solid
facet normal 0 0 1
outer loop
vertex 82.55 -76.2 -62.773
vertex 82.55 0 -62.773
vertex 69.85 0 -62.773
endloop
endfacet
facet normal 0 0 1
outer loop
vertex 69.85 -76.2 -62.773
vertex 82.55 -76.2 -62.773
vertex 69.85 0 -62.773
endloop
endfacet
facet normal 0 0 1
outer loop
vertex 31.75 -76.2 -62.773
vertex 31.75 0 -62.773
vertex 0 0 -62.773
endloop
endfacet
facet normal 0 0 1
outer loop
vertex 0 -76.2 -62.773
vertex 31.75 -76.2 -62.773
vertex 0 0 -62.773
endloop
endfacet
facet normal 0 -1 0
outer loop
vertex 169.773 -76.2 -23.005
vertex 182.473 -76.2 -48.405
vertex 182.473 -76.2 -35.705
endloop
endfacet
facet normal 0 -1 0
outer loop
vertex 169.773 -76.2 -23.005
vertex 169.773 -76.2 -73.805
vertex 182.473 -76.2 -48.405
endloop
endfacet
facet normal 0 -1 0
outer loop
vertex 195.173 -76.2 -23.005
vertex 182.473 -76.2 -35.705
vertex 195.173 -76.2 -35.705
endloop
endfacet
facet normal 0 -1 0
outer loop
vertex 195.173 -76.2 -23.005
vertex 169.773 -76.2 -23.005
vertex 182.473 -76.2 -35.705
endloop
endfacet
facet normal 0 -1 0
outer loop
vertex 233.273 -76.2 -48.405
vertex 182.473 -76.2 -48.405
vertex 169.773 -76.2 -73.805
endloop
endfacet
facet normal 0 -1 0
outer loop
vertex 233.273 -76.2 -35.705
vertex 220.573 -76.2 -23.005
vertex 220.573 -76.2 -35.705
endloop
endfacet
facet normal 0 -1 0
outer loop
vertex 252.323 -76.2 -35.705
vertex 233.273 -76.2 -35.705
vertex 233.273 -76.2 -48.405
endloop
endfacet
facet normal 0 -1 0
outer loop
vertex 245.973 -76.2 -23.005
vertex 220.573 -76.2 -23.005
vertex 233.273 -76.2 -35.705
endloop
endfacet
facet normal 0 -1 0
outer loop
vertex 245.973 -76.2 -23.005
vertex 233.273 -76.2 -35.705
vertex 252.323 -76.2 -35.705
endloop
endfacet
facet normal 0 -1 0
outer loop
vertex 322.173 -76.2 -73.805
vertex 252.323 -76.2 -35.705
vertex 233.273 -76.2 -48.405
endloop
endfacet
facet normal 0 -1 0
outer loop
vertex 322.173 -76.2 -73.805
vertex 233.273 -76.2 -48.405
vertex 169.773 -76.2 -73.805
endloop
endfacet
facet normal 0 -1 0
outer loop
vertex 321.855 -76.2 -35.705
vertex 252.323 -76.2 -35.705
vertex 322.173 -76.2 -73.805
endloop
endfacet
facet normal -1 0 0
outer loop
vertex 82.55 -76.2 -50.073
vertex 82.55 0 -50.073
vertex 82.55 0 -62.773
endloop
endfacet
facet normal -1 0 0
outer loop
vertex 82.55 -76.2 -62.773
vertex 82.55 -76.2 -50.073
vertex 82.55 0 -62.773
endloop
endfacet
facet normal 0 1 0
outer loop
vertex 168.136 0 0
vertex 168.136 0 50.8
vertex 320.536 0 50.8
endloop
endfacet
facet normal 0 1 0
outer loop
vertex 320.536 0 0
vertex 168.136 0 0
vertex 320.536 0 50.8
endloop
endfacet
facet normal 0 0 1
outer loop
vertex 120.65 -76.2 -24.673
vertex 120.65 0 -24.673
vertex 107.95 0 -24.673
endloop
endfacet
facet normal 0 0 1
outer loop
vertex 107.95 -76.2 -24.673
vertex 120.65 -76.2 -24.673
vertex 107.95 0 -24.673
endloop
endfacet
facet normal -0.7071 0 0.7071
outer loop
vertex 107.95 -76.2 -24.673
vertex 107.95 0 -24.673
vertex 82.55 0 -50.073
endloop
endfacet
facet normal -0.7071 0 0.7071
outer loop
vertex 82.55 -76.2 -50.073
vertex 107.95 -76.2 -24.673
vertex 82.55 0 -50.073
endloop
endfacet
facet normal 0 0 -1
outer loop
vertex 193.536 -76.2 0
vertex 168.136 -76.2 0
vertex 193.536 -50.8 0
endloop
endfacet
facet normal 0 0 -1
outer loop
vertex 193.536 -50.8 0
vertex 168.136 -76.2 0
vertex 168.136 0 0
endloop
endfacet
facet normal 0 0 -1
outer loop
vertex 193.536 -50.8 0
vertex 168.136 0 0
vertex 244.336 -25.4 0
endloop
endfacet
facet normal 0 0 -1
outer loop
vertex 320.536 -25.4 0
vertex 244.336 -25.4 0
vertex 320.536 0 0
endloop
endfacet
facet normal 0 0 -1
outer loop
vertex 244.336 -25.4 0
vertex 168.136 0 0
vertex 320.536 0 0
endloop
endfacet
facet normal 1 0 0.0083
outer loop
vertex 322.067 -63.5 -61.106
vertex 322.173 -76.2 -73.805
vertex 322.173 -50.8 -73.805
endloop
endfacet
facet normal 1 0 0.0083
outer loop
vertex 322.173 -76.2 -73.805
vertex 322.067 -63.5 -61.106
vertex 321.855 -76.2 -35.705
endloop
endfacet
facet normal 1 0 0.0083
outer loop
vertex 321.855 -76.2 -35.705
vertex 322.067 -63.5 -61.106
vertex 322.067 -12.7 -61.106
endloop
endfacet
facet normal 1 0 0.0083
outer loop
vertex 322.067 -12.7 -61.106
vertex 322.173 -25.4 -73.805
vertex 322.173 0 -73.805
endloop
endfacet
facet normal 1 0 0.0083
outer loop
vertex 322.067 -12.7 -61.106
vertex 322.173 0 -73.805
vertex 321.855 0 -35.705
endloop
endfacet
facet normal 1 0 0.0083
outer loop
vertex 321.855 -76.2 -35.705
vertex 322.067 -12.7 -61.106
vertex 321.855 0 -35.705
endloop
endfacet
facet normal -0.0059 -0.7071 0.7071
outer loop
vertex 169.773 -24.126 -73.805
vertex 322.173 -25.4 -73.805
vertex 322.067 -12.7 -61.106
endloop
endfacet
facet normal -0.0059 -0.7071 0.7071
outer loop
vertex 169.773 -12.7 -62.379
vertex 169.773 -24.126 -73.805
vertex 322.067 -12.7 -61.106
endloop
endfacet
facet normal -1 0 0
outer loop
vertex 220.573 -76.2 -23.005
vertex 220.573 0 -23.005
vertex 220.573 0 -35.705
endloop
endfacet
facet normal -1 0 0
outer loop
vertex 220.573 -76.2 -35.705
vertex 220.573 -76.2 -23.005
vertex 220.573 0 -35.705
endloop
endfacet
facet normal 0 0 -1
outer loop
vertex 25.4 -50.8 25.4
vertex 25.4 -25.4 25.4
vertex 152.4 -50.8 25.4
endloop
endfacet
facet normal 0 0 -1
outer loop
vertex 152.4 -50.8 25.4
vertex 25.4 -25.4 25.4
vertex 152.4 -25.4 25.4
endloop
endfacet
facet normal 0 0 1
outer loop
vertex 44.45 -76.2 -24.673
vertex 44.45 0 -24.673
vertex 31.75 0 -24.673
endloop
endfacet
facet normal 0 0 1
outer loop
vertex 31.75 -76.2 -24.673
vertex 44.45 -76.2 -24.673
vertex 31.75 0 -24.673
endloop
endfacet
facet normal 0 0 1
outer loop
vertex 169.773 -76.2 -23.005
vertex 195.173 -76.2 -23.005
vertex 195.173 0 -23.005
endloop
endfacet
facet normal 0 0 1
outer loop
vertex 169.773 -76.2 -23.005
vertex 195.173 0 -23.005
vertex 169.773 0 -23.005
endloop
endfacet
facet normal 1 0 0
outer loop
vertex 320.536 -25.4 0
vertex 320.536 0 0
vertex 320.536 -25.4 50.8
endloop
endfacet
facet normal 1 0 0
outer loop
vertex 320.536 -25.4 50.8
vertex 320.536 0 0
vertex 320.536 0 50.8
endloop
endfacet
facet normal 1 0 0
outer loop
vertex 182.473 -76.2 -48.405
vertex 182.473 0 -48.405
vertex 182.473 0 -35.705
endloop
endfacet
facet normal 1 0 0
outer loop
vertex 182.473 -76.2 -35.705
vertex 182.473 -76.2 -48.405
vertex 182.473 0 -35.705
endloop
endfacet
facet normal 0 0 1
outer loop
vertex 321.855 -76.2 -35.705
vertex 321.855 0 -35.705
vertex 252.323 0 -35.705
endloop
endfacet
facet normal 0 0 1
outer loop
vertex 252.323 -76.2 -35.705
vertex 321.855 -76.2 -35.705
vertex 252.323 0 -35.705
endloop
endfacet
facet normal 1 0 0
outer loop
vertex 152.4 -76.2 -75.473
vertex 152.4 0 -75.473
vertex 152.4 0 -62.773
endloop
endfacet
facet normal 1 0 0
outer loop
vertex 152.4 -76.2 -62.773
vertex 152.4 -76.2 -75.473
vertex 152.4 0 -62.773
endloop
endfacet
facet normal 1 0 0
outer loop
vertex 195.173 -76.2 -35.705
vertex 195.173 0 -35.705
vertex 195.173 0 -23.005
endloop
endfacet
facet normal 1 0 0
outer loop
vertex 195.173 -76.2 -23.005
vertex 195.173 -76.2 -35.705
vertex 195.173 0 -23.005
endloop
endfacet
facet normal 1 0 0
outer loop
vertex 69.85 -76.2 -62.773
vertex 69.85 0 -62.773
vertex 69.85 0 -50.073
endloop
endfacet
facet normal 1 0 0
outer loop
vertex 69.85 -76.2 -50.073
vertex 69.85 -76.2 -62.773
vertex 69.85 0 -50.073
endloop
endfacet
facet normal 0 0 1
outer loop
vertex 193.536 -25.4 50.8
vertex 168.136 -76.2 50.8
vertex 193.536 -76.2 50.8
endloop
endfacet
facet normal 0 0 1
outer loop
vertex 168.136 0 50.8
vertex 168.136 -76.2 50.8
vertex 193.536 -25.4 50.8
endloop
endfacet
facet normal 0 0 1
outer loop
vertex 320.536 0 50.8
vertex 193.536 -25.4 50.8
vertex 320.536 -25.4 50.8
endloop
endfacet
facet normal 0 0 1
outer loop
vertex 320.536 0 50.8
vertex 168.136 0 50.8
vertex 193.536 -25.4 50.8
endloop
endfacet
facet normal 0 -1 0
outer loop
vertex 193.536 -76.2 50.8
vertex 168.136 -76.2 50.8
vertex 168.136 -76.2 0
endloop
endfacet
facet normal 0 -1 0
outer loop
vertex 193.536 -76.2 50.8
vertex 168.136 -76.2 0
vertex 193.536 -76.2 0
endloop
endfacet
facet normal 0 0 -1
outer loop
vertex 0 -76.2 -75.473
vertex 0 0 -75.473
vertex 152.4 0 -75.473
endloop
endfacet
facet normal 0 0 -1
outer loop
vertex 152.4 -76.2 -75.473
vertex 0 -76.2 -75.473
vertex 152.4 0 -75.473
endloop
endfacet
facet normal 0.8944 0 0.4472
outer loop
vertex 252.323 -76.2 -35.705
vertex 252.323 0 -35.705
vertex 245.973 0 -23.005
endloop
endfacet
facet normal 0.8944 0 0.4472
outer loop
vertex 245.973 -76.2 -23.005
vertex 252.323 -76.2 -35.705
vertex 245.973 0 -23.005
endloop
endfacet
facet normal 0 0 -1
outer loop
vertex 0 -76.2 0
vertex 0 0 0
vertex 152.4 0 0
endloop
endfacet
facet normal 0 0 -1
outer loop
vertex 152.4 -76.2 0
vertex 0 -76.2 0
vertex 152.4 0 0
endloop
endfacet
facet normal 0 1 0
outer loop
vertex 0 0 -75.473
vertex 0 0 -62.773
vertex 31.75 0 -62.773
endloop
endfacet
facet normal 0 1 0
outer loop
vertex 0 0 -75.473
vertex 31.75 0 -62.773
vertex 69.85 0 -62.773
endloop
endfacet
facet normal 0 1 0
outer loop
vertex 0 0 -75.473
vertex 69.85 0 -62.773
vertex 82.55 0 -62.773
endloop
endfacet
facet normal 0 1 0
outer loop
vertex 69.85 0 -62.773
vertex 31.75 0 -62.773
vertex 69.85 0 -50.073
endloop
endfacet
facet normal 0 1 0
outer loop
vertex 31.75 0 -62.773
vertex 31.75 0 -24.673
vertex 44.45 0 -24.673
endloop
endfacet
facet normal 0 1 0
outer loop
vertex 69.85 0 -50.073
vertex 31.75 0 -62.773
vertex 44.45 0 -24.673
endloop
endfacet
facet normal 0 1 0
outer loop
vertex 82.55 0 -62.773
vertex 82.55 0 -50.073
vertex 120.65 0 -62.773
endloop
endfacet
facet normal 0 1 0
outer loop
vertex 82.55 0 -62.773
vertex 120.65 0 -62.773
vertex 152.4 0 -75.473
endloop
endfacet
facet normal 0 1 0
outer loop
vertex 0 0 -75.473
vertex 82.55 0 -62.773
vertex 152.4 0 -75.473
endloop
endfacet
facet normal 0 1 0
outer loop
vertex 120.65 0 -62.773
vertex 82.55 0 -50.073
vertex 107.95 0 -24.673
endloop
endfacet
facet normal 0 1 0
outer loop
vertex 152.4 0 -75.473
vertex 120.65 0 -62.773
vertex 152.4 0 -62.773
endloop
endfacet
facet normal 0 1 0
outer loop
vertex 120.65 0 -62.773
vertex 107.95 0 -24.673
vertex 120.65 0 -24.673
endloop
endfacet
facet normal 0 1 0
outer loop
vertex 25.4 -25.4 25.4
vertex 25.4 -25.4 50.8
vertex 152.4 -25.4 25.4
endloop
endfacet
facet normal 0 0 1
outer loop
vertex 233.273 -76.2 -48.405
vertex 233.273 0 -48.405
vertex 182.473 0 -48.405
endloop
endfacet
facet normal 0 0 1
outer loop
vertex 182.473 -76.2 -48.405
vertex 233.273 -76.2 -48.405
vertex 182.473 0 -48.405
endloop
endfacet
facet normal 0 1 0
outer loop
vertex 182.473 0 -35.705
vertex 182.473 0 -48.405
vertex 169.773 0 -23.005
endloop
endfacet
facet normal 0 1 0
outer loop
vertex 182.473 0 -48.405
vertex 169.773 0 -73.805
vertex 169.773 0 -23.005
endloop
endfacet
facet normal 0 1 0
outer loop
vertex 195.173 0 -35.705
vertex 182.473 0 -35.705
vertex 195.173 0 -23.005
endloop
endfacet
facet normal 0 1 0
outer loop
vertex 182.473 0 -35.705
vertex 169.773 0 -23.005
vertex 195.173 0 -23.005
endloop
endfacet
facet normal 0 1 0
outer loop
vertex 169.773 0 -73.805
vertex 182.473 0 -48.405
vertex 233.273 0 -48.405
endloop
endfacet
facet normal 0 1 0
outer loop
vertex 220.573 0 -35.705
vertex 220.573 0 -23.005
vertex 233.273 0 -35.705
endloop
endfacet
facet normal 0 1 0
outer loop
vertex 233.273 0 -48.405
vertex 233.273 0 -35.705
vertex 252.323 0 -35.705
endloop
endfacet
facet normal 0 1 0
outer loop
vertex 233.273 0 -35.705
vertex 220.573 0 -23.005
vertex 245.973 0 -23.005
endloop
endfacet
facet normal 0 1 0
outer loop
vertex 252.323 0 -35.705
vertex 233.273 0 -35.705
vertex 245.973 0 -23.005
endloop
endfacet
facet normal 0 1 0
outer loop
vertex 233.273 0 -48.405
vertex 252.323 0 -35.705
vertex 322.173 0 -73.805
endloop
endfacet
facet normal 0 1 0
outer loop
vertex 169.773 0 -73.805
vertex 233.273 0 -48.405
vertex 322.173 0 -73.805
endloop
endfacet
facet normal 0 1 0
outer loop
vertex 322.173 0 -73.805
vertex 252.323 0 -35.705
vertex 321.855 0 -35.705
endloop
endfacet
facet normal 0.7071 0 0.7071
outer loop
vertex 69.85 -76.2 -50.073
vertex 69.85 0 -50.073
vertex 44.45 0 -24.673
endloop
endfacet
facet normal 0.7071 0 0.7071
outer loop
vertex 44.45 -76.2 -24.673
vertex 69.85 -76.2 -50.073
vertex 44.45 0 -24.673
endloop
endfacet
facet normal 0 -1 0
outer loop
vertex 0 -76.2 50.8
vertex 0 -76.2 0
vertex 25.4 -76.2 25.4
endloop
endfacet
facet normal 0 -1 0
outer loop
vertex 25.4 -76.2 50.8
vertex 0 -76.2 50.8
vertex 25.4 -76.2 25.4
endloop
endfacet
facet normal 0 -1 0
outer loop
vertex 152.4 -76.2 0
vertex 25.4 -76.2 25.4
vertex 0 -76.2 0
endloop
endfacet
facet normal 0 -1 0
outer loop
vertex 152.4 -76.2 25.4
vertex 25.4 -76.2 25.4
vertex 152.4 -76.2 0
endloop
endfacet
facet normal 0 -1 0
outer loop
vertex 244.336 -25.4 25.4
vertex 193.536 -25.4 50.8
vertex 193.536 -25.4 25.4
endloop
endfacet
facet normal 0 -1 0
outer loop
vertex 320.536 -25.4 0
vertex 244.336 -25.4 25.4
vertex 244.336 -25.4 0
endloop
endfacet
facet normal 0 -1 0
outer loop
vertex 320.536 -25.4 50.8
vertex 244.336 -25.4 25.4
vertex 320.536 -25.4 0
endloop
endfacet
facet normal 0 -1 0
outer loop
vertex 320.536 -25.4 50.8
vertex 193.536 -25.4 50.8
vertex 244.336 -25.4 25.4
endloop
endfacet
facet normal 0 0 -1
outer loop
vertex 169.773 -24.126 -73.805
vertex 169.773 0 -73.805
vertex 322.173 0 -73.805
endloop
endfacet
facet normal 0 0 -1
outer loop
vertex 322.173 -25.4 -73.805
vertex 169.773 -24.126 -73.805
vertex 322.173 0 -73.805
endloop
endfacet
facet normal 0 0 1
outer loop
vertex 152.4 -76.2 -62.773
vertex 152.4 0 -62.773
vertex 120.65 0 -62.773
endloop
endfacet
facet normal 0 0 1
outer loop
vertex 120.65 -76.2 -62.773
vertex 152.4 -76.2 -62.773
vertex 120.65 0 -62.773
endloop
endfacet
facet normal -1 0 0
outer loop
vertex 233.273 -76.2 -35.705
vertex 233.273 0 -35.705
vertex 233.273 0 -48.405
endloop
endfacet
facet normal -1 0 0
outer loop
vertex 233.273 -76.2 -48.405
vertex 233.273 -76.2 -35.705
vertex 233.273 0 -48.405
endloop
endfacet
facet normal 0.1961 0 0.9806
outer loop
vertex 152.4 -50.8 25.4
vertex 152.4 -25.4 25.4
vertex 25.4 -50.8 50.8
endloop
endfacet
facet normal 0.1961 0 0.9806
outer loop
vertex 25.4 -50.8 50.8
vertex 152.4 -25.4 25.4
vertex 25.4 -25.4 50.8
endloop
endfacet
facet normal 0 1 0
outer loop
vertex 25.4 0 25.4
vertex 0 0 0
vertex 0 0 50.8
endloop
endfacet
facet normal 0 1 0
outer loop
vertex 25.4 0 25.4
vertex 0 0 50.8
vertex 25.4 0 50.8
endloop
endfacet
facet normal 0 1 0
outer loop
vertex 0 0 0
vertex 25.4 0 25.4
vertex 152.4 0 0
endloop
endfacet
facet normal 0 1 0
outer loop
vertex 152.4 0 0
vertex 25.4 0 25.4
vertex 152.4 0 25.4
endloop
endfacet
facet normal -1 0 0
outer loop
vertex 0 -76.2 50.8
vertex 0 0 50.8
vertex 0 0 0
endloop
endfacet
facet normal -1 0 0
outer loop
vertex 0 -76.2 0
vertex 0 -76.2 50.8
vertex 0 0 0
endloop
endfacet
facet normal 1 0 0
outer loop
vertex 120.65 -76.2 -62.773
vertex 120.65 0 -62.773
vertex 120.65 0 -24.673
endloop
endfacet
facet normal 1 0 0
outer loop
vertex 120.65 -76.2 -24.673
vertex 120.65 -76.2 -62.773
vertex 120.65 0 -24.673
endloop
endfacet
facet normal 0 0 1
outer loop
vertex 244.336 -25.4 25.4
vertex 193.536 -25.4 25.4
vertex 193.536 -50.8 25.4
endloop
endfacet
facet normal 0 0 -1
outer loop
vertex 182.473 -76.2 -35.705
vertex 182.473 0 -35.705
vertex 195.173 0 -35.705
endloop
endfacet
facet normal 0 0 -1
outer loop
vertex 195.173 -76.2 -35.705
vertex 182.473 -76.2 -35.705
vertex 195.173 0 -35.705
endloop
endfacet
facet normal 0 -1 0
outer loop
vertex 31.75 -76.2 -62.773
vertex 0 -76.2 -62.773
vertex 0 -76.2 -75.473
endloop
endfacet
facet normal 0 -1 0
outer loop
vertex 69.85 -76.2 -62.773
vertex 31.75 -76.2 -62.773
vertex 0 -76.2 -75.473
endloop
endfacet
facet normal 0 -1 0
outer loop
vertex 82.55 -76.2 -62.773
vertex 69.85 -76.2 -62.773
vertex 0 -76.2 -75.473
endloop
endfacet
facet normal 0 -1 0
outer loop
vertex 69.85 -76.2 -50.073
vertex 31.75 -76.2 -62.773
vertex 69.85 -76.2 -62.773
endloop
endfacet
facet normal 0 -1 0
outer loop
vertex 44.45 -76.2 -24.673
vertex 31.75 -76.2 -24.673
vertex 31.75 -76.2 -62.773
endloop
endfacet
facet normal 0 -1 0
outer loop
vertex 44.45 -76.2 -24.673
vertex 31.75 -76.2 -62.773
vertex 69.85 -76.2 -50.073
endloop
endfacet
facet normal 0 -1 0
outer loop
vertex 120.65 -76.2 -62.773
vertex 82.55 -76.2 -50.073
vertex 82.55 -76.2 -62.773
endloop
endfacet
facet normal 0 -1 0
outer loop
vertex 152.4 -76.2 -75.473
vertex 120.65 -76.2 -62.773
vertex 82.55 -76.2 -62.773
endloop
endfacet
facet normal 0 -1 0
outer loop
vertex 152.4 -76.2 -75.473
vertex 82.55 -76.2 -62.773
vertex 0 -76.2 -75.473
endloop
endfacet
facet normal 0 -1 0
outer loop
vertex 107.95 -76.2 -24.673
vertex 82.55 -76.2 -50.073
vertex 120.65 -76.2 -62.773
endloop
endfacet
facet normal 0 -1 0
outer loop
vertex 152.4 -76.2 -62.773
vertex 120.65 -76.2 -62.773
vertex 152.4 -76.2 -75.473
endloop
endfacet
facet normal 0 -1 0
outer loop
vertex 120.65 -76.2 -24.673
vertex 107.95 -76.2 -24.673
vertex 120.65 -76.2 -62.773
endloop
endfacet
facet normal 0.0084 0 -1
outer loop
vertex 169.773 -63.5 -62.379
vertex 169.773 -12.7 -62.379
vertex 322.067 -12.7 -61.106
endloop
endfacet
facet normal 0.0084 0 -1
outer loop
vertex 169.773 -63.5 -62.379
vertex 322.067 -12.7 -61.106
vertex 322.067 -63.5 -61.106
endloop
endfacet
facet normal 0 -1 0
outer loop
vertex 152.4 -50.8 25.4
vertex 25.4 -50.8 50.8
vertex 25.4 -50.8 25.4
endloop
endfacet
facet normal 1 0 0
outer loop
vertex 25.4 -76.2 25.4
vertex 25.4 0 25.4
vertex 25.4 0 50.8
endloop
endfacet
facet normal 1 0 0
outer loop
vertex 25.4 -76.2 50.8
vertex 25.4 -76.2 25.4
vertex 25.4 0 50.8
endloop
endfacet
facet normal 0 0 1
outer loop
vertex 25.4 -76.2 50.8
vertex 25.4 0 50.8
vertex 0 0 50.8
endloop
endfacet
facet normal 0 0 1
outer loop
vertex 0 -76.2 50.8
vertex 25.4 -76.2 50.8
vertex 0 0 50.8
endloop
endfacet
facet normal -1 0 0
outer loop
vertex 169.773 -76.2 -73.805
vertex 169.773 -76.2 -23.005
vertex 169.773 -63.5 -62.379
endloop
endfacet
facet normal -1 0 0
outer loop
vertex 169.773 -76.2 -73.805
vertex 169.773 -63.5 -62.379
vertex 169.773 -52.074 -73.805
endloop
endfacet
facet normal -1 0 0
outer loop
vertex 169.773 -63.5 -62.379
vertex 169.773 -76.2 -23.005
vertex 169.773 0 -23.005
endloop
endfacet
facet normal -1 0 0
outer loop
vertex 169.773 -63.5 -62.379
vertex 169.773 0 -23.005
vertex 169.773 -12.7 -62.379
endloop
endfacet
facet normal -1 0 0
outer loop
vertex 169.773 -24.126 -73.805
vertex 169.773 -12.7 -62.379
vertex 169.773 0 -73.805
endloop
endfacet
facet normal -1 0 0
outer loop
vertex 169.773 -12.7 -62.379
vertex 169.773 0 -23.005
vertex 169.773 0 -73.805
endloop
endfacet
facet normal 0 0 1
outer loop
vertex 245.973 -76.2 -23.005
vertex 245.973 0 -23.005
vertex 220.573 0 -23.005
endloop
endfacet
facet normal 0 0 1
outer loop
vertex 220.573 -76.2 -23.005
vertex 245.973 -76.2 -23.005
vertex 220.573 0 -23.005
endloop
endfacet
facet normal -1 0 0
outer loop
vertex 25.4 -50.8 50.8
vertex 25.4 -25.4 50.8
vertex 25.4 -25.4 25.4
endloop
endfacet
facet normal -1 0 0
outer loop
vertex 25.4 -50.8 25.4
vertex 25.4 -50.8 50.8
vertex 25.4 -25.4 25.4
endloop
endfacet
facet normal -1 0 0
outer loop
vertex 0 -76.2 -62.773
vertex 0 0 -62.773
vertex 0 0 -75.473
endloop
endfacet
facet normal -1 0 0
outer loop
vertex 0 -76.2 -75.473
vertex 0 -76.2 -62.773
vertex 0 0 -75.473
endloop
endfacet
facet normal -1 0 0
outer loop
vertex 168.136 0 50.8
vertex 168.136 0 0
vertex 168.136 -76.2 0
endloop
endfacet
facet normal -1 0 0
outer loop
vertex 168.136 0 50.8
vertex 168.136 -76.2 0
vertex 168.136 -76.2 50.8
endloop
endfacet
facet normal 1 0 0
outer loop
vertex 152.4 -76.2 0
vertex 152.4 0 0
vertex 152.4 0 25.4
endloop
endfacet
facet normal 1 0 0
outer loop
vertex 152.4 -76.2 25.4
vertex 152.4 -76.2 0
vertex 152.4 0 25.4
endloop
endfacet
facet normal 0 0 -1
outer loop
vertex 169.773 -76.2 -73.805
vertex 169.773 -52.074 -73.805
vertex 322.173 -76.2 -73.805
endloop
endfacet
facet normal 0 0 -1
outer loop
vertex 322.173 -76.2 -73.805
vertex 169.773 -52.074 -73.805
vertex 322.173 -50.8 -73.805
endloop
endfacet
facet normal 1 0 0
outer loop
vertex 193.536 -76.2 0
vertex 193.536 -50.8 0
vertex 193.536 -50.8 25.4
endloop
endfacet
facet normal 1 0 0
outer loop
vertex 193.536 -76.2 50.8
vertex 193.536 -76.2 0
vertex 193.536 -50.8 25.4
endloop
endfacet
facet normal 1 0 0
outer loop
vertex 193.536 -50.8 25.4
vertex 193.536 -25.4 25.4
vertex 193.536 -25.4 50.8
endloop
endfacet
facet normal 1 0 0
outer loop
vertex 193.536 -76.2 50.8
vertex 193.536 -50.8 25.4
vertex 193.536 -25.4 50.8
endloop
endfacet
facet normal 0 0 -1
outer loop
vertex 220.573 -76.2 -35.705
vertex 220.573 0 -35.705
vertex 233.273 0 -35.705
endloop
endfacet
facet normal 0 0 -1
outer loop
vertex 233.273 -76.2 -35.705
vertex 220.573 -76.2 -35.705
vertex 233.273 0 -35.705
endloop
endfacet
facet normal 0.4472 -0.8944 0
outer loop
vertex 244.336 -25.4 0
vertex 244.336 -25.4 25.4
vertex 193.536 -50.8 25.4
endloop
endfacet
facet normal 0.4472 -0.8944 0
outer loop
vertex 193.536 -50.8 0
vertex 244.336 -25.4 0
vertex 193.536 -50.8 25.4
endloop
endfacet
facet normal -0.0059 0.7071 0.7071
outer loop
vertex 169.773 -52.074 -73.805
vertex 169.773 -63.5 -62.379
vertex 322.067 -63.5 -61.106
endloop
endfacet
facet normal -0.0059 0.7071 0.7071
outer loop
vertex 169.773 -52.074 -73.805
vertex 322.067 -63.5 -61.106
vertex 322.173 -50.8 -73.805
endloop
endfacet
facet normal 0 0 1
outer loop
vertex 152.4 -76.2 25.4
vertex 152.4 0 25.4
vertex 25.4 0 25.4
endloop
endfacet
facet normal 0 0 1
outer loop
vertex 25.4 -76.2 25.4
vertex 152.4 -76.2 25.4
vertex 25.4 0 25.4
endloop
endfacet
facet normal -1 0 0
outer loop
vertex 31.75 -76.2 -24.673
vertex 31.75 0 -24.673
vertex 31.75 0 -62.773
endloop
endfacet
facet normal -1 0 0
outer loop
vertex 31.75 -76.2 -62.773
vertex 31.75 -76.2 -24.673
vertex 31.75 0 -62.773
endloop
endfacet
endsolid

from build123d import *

# Parameters (mm, degrees)
F1_DEPTH  = 76.2
F2_DEPTH  = 76.2
F3_W      = 129.5150956453
F3_H      = 25.4
F4_DEPTH  = 25.4
F5_DEPTH  = 25.4
F6_W      = 127
F6_H      = 50.8
F7_DEPTH  = 25.4
F6_W_2    = 25.4
F8_DEPTH  = 76.2
F9_W      = 50.8
F9_H      = 25.4
F10_DEPTH = 25.4
F12_DEPTH = 25.4
F15_DEPTH = 76.2
F16_DEPTH = 76.2
F18_DEPTH = 152.4


with BuildPart() as f1:
    # F0 (on Front) → F1 (new body)
    with BuildSketch(Plane.XZ):
        Polygon((0, 50.8), (0, 0), (152.4, 0), (152.4, 25.4), (25.4, 25.4), (25.4, 50.8), align=None)
    extrude(amount=F1_DEPTH)


with BuildPart() as f2:
    # F0 (on Front) → F2 (new body)
    with BuildSketch(Plane.XZ):
        Polygon((25.4, 25.4), (152.4, 25.4), (25.4, 50.8), align=None)
    extrude(amount=F2_DEPTH)

    # F3 (on face) → F4 (cut)
    with BuildSketch(Plane(origin=(10.7461538462, 0, 53.7307692308), x_dir=(0.9805806757, 0, -0.1961161351), z_dir=(0.1961161351, 0, 0.9805806757))):
        with Locations((79.7015973202, -63.5)):
            Rectangle(F3_W, F3_H)
    extrude(amount=-F4_DEPTH, mode=Mode.SUBTRACT)

    # F3 (on face) → F5 (cut)
    with BuildSketch(Plane(origin=(10.7461538462, 0, 53.7307692308), x_dir=(0.9805806757, 0, -0.1961161351), z_dir=(0.1961161351, 0, 0.9805806757))):
        with Locations((79.7015973202, -12.7)):
            Rectangle(F3_W, F3_H)
    extrude(amount=-F5_DEPTH, mode=Mode.SUBTRACT)


with BuildPart() as f7:
    # F6 (on Front) → F7 (new body)
    with BuildSketch(Plane.XZ):
        with Locations((257.0362193159, 25.4)):
            Rectangle(F6_W, F6_H)
    extrude(amount=F7_DEPTH)

    # F6 (on Front) → F8 (join)
    with BuildSketch(Plane.XZ):
        with Locations((180.8362193159, 25.4)):
            Rectangle(F6_W_2, F6_H)
    extrude(amount=F8_DEPTH)

    # F9 (on face) → F10 (join)
    with BuildSketch(Plane.XZ.offset(25.4)):
        with Locations((218.9362193159, 12.7)):
            Rectangle(F9_W, F9_H)
    extrude(amount=F10_DEPTH)

    # F11 (on face) → F12 (cut)
    with BuildSketch(Plane.XY.offset(25.4)):
        Polygon((244.3362193159, -25.4), (193.5362193159, -50.8), (244.3362193159, -50.8), align=None)
    extrude(amount=-F12_DEPTH, mode=Mode.SUBTRACT)


with BuildPart() as f15:
    # F13 (on Front) → F15 (new body)
    with BuildSketch(Plane.XZ):
        Polygon((0, -62.7732424857), (0, -75.4732424857), (152.4, -75.4732424857), (152.4, -62.7732424857), (120.65, -62.7732424857), (120.65, -24.6732424857), (107.95, -24.6732424857), (82.55, -50.0732424857), (82.55, -62.7732424857), (69.85, -62.7732424857), (69.85, -50.0732424857), (44.45, -24.6732424857), (31.75, -24.6732424857), (31.75, -62.7732424857), align=None)
    extrude(amount=F15_DEPTH)


with BuildPart() as f16:
    # F14 (on Front) → F16 (new body)
    with BuildSketch(Plane.XZ):
        Polygon((169.773291292, -23.0053452725), (169.773291292, -73.8053452725), (322.173291292, -73.8053452725), (321.8548595905, -35.7053452725), (252.323291292, -35.7053452725), (245.973291292, -23.0053452725), (220.573291292, -23.0053452725), (220.573291292, -35.7053452725), (233.273291292, -35.7053452725), (233.273291292, -48.4053452725), (182.473291292, -48.4053452725), (182.473291292, -35.7053452725), (195.173291292, -35.7053452725), (195.173291292, -23.0053452725), align=None)
    extrude(amount=F16_DEPTH)

    # F17 (on face) → F18 (cut)
    with BuildSketch(Plane(origin=(321.5339819162, 0, 2.6873126754), x_dir=(0, 1, 0), z_dir=(0.9999650755, 0, 0.0083574955))):
        Polygon((-63.5, -63.7953295072), (-50.8, -76.4953295072), (-25.4, -76.4953295072), (-12.7, -63.7953295072), align=None)
    extrude(amount=-F18_DEPTH, mode=Mode.SUBTRACT)


solid = Compound([f1.part, f2.part, f7.part, f15.part, f16.part])
